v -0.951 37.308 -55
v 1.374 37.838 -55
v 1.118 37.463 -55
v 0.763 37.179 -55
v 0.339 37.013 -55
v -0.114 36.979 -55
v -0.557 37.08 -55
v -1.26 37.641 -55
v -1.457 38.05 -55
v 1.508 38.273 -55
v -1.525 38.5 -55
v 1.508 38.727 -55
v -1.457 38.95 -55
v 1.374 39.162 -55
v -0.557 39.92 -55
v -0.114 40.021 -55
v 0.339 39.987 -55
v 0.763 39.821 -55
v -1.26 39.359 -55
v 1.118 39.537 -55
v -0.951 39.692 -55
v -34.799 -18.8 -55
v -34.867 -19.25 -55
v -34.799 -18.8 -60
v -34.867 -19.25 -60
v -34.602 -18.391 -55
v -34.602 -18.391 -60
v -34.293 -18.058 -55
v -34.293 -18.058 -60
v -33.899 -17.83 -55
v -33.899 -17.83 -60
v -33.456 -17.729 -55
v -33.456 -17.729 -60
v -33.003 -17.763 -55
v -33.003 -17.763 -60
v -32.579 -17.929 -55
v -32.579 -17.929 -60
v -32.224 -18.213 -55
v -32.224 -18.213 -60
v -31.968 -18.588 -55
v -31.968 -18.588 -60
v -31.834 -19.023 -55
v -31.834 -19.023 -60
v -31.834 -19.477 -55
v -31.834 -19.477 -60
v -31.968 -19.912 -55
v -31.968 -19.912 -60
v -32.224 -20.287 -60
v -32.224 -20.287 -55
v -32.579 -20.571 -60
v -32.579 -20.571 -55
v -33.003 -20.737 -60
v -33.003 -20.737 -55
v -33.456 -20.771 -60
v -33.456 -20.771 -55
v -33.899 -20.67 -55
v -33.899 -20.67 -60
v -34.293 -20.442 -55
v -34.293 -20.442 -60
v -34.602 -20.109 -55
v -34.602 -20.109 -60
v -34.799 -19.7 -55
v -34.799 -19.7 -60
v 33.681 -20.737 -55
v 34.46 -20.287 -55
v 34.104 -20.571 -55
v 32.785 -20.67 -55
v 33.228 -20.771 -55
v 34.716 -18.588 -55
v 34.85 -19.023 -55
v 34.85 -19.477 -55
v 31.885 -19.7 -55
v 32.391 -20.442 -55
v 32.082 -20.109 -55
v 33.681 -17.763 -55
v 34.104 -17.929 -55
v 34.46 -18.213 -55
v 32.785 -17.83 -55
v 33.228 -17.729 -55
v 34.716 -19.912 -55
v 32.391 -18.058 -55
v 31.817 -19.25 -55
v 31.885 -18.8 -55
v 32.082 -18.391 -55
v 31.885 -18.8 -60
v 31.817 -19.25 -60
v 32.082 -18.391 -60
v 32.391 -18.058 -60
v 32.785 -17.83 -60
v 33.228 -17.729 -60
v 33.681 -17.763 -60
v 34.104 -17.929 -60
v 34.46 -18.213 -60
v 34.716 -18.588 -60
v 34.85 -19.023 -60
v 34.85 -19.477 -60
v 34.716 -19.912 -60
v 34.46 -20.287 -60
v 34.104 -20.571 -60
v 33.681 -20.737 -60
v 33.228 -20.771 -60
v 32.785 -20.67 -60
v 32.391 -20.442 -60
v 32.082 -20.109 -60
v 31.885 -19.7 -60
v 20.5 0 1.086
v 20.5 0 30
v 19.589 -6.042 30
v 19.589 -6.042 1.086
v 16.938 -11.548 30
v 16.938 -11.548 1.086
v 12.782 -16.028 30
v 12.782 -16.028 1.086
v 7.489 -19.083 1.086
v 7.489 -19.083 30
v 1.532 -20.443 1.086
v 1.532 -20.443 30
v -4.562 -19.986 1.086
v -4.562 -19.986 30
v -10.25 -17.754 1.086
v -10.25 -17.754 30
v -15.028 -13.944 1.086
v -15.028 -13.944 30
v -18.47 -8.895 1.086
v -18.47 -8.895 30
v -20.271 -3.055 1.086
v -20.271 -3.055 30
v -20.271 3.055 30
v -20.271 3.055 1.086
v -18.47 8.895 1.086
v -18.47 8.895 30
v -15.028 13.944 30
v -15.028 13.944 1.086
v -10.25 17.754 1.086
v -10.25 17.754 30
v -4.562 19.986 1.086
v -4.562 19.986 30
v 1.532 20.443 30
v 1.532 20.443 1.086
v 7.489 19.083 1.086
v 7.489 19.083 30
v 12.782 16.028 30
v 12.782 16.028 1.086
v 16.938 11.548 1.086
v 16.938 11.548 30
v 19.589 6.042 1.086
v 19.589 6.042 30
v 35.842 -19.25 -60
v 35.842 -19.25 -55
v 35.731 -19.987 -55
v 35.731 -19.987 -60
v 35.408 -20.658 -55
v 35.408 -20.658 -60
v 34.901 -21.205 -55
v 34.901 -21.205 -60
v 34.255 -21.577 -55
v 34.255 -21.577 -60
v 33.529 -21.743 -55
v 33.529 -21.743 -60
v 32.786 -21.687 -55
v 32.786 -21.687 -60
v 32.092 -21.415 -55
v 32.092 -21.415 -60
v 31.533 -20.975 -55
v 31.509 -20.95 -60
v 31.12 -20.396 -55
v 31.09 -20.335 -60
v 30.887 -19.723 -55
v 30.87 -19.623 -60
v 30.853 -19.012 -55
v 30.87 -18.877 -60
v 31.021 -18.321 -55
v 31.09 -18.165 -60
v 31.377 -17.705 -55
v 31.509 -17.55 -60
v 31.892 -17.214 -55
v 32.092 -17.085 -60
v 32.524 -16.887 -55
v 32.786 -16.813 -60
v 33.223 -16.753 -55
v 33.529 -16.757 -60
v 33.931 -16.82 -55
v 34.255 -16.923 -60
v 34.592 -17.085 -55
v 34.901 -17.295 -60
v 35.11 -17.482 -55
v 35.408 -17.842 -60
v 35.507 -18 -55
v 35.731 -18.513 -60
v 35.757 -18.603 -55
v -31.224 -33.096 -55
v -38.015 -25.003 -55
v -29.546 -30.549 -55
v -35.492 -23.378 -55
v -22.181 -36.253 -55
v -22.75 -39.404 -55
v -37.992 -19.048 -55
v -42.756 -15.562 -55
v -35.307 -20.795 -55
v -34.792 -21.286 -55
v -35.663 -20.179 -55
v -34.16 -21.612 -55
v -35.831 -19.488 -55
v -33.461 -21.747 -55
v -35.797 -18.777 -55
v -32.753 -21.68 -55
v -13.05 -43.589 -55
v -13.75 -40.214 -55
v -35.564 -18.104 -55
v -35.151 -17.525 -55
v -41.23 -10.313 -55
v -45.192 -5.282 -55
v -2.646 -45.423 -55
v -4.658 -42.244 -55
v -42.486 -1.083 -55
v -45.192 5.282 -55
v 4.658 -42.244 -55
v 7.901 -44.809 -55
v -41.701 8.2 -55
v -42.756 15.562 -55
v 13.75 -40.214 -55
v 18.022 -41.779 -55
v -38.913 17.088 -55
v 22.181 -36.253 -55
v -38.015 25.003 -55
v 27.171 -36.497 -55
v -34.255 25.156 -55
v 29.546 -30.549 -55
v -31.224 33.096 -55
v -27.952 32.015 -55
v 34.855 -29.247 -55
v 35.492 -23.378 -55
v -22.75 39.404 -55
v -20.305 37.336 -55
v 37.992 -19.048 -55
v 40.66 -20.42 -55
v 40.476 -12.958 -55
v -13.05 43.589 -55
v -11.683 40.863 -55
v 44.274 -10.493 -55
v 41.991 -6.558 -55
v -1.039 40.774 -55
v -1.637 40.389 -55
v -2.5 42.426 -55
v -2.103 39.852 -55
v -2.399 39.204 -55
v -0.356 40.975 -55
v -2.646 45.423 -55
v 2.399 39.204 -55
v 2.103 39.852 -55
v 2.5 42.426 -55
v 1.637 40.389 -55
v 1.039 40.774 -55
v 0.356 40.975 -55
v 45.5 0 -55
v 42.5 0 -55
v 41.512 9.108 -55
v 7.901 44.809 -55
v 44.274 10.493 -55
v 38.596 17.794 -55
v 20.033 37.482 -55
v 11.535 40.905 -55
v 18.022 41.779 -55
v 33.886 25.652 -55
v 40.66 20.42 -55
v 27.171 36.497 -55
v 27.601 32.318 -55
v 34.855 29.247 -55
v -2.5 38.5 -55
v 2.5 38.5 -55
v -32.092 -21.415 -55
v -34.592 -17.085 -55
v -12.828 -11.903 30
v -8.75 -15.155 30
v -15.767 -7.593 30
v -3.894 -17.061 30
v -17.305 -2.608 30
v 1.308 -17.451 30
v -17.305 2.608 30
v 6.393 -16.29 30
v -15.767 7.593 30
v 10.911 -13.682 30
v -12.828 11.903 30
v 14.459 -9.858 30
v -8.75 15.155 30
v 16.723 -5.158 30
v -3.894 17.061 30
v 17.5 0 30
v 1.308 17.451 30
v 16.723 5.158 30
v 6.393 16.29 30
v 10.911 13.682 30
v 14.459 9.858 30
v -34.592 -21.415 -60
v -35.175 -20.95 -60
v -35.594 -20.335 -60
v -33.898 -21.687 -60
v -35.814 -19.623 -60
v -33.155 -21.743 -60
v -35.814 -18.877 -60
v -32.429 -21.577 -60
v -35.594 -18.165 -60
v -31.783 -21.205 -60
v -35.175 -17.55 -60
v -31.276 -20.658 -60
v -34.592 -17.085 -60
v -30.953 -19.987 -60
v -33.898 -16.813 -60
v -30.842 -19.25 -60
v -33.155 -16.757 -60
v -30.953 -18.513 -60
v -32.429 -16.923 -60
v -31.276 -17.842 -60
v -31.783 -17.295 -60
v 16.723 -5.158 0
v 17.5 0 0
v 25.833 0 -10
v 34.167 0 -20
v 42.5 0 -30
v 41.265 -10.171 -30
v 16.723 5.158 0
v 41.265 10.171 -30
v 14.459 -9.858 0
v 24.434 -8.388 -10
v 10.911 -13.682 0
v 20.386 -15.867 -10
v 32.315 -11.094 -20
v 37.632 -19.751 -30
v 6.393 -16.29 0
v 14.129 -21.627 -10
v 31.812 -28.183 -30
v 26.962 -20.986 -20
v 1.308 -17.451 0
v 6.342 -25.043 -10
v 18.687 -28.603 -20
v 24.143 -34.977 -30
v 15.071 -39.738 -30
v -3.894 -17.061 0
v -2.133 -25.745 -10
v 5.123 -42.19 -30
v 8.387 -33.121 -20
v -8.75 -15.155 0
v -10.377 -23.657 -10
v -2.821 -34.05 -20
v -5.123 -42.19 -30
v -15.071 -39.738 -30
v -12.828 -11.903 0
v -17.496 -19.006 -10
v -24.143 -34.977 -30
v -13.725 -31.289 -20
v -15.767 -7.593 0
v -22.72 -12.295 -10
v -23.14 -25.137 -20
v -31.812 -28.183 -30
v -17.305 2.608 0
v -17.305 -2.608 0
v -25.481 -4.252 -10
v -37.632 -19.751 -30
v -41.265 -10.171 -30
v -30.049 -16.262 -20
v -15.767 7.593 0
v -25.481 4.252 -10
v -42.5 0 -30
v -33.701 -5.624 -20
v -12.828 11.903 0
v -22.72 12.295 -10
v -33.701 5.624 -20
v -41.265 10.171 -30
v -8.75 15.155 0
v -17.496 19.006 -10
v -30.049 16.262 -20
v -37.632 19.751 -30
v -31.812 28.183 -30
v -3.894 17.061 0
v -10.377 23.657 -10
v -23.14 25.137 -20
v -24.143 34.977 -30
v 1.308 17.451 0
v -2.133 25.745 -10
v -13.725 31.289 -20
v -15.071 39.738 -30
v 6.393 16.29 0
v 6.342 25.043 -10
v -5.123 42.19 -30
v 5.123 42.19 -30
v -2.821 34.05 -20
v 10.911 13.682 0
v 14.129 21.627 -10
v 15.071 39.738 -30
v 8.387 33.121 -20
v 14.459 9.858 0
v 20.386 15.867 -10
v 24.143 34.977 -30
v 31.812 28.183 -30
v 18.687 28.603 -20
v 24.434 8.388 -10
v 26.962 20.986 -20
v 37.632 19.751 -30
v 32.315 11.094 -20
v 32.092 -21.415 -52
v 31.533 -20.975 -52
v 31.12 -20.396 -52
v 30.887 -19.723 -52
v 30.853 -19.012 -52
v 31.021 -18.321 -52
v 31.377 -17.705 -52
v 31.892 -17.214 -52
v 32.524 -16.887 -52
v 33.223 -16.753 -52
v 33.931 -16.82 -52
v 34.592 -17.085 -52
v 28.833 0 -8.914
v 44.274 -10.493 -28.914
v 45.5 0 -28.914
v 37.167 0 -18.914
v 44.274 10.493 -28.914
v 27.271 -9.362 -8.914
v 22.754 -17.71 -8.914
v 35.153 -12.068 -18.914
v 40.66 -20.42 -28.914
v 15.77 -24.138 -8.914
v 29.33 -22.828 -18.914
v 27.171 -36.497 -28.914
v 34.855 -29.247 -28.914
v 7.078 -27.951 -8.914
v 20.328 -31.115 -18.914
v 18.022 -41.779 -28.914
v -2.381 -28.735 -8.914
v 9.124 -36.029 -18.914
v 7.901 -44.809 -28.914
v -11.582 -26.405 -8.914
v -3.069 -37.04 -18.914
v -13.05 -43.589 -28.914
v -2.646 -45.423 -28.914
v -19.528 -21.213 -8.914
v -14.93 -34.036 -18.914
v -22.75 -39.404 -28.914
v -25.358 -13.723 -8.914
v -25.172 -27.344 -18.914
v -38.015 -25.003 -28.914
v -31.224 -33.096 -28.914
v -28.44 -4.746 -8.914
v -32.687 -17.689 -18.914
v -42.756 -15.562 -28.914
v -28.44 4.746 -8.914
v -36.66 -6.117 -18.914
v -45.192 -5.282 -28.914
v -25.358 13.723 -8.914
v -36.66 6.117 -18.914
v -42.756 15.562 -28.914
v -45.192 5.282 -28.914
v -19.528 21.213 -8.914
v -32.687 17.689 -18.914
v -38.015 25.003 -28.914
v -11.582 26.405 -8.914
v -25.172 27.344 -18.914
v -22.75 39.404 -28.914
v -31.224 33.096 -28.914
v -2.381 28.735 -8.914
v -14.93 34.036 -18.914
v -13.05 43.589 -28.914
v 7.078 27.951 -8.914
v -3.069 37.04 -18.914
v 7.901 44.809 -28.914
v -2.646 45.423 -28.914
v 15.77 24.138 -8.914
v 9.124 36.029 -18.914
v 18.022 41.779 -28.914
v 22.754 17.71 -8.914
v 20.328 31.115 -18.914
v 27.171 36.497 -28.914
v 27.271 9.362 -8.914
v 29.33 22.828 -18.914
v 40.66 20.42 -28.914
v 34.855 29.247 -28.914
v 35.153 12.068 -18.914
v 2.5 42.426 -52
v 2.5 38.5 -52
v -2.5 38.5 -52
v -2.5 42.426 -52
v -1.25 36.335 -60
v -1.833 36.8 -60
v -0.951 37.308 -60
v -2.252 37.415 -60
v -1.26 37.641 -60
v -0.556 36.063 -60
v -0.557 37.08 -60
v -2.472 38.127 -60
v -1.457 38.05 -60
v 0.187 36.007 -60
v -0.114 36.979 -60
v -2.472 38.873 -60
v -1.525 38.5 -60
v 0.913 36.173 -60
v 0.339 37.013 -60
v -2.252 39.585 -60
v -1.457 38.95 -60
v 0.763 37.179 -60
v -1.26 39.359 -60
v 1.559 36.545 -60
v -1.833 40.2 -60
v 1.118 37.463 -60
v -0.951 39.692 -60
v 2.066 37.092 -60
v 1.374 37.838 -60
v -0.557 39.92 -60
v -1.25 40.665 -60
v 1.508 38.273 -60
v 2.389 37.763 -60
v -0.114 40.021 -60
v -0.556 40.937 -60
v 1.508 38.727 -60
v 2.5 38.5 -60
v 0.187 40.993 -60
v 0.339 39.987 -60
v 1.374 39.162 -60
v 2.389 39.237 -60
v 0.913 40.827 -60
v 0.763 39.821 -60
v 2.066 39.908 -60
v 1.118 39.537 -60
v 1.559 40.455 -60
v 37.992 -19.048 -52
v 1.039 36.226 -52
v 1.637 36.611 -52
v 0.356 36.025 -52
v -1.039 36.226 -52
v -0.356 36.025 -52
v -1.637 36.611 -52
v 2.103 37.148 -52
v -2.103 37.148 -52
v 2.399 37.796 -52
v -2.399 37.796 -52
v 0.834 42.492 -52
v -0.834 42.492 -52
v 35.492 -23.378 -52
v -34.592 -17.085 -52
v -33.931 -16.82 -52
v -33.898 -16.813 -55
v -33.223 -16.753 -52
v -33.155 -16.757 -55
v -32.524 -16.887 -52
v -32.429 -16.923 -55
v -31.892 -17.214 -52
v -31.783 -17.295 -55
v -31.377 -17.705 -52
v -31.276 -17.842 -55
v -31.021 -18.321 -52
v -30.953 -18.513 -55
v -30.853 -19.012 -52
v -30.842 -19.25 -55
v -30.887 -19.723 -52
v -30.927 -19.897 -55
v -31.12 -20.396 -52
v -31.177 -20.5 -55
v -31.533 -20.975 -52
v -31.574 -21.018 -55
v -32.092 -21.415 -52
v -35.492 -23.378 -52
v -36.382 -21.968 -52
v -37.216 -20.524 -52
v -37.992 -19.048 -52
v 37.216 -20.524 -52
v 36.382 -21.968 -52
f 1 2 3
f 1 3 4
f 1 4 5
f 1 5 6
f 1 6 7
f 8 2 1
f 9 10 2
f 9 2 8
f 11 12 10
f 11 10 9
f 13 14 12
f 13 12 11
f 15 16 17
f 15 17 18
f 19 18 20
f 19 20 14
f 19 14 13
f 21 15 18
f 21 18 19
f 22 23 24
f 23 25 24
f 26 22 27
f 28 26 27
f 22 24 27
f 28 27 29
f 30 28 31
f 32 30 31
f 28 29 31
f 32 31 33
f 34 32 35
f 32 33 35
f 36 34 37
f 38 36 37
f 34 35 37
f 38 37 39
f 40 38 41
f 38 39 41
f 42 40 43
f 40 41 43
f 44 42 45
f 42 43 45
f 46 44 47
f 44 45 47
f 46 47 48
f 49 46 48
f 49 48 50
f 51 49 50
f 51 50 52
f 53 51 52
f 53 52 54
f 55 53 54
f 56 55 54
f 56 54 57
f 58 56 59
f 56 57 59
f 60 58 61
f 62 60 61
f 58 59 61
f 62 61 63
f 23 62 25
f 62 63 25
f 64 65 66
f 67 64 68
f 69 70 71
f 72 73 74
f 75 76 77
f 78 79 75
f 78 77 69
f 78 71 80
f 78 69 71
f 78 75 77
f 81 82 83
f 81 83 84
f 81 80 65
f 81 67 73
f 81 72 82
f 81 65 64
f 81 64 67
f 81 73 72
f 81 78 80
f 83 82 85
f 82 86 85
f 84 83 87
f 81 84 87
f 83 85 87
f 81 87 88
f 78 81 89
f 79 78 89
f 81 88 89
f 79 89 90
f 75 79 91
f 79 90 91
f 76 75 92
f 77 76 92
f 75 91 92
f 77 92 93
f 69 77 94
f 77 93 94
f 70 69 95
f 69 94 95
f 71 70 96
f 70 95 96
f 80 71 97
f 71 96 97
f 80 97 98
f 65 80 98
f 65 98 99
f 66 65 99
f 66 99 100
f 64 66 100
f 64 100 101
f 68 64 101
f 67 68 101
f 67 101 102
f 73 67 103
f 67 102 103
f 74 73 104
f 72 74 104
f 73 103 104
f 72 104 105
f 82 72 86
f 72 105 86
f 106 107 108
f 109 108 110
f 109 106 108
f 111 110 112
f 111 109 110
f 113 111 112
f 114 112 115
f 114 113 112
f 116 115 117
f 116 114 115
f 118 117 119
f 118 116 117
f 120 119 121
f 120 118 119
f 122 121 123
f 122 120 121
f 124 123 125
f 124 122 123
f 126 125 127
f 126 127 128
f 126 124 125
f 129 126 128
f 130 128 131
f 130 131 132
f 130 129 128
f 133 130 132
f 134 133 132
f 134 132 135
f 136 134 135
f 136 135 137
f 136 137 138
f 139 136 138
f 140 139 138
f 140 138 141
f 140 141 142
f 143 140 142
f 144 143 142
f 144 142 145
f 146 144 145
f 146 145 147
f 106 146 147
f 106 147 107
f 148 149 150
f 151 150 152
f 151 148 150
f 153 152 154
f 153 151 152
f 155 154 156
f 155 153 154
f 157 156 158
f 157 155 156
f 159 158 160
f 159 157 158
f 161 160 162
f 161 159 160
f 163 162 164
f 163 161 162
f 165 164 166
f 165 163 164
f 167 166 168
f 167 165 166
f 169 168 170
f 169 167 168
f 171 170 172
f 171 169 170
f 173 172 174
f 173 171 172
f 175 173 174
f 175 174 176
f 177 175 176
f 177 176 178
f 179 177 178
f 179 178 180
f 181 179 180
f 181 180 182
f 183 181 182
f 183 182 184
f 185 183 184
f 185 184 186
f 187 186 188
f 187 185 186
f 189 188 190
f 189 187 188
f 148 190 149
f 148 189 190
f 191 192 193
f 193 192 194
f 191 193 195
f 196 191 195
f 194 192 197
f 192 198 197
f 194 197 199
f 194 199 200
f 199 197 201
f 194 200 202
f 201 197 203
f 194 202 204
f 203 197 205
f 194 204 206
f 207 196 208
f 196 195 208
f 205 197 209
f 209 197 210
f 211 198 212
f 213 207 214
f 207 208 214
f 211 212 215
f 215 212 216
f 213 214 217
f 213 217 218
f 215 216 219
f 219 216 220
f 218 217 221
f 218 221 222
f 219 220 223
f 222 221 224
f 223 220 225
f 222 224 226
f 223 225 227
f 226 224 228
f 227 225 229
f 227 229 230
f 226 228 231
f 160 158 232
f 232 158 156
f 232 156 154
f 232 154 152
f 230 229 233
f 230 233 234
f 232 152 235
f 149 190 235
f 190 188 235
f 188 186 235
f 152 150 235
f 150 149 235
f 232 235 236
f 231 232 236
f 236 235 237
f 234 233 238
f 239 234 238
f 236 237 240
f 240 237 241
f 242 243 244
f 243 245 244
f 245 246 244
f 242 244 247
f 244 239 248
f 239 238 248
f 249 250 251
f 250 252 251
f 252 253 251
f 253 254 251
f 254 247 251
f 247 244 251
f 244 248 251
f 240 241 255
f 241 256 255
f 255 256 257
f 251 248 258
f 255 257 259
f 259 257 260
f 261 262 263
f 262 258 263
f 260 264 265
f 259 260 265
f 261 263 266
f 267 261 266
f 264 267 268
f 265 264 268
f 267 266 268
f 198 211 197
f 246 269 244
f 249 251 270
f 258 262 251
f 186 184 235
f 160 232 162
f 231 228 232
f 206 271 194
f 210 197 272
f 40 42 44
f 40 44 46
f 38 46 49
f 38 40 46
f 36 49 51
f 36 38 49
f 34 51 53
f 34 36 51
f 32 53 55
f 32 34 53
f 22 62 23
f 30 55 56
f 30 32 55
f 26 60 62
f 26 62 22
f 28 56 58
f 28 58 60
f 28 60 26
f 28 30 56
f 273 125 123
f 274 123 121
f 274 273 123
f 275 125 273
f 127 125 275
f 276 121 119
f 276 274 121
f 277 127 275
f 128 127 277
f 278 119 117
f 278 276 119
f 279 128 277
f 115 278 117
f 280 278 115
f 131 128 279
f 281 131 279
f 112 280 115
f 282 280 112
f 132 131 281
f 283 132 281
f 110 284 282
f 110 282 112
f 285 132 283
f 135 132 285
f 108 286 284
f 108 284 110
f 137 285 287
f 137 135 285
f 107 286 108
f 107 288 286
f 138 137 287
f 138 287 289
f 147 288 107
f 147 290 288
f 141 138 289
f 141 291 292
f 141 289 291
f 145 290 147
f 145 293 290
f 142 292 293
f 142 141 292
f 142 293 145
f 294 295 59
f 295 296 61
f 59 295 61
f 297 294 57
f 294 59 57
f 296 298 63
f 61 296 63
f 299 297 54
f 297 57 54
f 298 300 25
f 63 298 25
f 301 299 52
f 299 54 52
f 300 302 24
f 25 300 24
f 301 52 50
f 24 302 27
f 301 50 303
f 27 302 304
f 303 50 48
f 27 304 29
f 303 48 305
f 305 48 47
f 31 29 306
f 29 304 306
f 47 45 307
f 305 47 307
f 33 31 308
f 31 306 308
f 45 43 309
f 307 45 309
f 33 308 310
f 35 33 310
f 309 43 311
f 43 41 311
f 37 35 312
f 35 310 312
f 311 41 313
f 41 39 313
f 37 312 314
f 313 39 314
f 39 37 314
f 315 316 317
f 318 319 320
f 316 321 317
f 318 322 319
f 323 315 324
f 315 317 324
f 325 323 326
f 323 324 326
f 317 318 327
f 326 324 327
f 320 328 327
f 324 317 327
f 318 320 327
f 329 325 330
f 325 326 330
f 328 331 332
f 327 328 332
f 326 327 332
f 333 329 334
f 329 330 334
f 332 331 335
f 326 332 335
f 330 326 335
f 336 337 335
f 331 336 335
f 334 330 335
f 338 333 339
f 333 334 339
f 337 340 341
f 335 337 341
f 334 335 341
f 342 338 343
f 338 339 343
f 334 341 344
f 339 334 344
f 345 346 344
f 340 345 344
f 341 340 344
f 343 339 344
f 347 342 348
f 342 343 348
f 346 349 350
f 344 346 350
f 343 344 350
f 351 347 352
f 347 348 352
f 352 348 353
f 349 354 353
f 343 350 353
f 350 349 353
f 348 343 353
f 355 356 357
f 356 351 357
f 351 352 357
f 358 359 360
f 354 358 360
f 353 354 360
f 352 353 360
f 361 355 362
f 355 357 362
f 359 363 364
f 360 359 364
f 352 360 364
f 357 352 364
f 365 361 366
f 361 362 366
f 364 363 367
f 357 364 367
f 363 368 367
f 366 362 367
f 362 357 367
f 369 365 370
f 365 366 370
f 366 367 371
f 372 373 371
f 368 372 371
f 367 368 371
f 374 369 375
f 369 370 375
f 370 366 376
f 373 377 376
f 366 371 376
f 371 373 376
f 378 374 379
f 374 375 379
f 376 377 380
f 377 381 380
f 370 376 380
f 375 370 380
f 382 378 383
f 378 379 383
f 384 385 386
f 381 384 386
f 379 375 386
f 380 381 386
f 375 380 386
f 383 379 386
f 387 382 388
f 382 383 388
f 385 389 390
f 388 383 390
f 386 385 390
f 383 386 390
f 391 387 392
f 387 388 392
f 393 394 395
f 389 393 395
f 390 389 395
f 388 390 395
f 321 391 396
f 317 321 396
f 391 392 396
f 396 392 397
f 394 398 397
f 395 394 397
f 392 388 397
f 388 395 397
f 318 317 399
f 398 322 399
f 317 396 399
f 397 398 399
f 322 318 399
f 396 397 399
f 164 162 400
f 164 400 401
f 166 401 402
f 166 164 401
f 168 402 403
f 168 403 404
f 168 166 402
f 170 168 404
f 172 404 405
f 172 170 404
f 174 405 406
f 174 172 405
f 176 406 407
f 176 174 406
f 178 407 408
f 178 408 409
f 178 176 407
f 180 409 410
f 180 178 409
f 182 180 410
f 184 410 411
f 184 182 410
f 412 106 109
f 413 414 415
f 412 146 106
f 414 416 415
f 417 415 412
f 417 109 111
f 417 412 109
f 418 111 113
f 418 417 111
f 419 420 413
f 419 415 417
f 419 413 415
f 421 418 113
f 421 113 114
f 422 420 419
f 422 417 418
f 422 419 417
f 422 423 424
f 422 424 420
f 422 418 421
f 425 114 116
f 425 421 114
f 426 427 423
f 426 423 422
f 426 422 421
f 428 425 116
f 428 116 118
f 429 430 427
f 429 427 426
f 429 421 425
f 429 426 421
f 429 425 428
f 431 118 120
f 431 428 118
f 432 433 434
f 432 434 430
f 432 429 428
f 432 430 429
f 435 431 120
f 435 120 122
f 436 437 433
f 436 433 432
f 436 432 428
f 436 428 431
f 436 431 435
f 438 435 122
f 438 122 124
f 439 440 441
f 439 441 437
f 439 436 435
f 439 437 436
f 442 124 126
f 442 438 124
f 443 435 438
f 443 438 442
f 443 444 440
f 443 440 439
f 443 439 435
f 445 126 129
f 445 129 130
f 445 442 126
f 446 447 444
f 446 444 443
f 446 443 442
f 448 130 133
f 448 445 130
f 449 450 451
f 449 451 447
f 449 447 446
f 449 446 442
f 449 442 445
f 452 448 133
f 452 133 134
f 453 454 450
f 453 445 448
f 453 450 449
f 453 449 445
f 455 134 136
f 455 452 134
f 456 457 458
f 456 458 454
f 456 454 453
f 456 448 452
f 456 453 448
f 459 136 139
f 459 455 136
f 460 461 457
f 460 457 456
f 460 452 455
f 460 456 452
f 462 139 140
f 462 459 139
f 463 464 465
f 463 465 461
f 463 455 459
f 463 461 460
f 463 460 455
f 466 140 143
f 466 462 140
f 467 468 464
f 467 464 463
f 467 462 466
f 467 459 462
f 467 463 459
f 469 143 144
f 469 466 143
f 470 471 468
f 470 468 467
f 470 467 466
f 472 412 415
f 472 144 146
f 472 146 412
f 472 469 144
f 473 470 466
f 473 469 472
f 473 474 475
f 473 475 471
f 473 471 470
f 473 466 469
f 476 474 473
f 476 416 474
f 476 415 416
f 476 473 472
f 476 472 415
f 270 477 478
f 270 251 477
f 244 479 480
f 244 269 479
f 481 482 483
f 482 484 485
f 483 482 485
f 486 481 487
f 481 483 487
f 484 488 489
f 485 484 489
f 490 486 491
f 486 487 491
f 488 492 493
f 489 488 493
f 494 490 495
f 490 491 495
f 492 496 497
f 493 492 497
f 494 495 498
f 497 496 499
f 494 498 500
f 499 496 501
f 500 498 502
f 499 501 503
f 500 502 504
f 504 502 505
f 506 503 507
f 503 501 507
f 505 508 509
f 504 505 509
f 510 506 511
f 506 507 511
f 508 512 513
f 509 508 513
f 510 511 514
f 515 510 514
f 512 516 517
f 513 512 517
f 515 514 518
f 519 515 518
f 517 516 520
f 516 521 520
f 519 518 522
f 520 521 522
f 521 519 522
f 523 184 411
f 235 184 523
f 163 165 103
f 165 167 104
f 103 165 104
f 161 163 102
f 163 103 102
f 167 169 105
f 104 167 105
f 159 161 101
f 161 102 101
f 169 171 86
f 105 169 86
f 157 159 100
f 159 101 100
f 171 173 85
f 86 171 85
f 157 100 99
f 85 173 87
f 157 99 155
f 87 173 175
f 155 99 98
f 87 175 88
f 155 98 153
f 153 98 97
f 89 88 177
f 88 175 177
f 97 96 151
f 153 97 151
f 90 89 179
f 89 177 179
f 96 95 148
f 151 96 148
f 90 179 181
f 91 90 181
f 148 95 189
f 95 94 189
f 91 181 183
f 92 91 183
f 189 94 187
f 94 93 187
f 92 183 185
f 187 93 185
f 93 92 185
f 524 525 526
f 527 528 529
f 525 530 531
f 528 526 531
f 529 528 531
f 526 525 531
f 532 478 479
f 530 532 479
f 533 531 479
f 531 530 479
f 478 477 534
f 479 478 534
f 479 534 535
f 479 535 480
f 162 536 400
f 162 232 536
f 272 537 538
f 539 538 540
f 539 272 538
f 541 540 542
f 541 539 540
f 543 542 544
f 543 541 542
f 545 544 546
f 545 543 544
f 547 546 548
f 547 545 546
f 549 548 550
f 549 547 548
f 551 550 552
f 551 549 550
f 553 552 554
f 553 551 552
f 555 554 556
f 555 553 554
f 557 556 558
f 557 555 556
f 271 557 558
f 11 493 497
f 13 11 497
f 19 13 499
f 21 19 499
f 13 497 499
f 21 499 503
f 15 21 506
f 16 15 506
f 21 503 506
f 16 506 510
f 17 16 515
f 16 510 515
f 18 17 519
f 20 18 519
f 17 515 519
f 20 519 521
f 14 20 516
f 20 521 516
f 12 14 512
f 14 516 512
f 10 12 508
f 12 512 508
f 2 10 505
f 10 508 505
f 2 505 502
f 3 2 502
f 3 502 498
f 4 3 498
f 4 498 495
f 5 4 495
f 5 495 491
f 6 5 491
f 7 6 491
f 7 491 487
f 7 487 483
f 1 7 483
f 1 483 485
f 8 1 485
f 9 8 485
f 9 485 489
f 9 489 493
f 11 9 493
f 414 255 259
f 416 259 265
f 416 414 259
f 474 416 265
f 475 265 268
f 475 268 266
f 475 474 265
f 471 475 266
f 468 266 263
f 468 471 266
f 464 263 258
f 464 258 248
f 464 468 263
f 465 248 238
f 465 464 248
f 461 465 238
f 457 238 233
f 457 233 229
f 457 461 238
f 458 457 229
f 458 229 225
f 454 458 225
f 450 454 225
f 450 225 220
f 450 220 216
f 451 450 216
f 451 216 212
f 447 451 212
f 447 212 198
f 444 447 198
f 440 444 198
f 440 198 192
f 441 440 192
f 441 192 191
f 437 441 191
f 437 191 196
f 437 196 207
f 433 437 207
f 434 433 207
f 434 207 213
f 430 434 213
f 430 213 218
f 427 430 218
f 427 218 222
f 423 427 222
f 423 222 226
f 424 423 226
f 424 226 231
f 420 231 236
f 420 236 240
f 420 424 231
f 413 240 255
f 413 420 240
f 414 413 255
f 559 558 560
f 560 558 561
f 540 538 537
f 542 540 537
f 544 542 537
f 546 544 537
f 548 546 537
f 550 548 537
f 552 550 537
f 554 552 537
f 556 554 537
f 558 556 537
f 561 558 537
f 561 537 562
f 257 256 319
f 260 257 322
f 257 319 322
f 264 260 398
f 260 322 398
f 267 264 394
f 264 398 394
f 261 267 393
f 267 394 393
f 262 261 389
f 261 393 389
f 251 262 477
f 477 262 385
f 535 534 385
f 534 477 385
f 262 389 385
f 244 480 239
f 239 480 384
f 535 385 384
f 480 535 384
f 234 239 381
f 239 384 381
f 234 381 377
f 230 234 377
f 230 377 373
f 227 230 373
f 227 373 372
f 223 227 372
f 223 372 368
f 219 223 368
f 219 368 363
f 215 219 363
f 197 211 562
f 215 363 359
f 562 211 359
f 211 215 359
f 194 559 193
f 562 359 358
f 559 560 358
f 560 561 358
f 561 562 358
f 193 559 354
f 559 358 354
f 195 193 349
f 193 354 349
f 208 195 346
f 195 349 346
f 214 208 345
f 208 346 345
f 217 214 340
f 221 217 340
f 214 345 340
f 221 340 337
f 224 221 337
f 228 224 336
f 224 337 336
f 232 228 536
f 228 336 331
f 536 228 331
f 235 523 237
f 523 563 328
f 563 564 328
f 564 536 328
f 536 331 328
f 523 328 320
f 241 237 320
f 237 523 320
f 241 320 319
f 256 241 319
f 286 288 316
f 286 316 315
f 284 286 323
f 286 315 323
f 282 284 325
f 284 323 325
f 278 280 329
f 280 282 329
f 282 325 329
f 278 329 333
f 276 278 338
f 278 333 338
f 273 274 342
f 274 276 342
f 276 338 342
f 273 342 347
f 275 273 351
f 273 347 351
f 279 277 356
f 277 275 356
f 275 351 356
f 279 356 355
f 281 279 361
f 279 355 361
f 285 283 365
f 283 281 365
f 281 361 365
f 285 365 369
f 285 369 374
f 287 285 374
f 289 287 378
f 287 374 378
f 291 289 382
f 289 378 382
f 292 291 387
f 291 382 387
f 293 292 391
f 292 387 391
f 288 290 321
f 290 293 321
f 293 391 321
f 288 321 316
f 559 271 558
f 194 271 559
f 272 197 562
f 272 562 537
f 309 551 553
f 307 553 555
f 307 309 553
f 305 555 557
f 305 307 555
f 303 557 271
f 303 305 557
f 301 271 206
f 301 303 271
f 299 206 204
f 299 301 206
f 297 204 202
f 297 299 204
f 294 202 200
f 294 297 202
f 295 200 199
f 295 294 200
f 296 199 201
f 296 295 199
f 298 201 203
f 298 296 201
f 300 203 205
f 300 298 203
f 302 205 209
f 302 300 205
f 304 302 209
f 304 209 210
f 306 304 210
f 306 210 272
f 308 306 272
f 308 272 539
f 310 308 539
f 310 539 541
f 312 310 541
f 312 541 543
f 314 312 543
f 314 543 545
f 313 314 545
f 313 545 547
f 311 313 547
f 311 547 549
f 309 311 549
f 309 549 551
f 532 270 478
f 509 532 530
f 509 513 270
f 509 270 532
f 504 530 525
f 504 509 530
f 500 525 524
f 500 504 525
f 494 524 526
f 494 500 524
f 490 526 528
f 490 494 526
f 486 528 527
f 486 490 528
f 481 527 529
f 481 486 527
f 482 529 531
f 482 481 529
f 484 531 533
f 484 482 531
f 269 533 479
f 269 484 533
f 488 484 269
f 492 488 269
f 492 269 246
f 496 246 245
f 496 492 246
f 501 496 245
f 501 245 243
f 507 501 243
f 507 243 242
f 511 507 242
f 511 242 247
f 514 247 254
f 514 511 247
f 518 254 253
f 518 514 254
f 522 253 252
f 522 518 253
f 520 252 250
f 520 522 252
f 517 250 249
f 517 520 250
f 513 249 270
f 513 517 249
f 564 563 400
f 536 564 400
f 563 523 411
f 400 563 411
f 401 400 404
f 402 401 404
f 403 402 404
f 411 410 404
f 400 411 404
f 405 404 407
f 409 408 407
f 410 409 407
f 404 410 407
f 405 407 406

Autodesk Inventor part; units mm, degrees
ref_plane "YZ Plane" through (0, 0, 0) normal (1, 0, 0) x (0, 1, 0)
ref_plane "XZ Plane" through (0, 0, 0) normal (0, 1, 0) x (-1, 0, 0)
sketch "Boceto1" plane through (0, 0, 0) normal (0, 0, 1) x (1, 0, 0)
  line L0 (0, 124.4663) -> (0, -121.5162) construction
  line L1 (-141.4483, 0) -> (147.5578, 0) construction
  circle A0 centre (0, 0) radius 17.5
  dimension "d0" = 35
extrude "Extrusión1" add sketch "Boceto1" along normal blind 30
ref_plane "Plano de trabajo1" through (0, 0, -30) normal (0, 0, 1) x (1, 0, 0)
sketch "Boceto2" plane through (0, 0, -30) normal (0, 0, 1) x (1, 0, 0)
  circle A0 centre (0, 0) radius 42.5
  dimension "d4" = 85
loft "Solevación1" add profiles "Boceto2" section 2 edges at (-17.5, 0, 0)
ref_plane "Plano de trabajo2" through (0, 0, -55) normal (0, 0, 1) x (1, 0, 0)
sketch "Boceto3" plane through (0, 0, -55) normal (0, 0, 1) x (1, 0, 0)
  circle A0 centre (0, 0) radius 42.5
  dimension "d10" = 85
loft "Solevación2" add profiles "Boceto3" section 2 edges at (-42.5, 0, -30)
shell "Vaciado1" thickness 3 outward yes removed faces 2 at (-10.6049, 7.3037, -55) at (4.3663, -1.0762, 30)
sketch "Boceto4" plane through (0, 0, -55) normal (0, 0, -1) x (-1, 0, 0)
  circle A0 centre (0, 0) radius 44.5
  circle A1 centre (0, 0) radius 42.5
  line L0 (-2.5, 42.4264) -> (-2.5, 36.4244)
  line L1 (-2.5, 36.4244) -> (2.5, 36.4244)
  line L2 (2.5, 36.4244) -> (2.5, 42.4264)
  line L3 (-61.729, 0) -> (90.2911, 0) construction
  line L4 (0, 48.1461) -> (0, -48.1461) construction
  circle A2 centre (0, 0) radius 37 construction
  circle A3 centre (0, 0) radius 40 construction
  circle A4 centre (0, 0) radius 38.5 construction
  arc A5 (-2.5, 38.5) -> (2.5, 38.5) centre (0, 38.5) ccw
  line L5 (-35.4923, -23.3783) -> (-30.2945, -20.3773)
  arc A6 (-32.092, -21.4151) -> (-34.592, -17.0849) centre (-33.342, -19.25) ccw
  line L6 (-32.7945, -16.0472) -> (-37.9923, -19.0481)
  line L7 (37.9923, -19.0481) -> (32.7945, -16.0472)
  arc A7 (34.592, -17.0849) -> (32.092, -21.4151) centre (33.342, -19.25) ccw
  line L8 (30.2945, -20.3773) -> (35.4923, -23.3783)
  dimension "d21" = 77
  dimension "d16" = 85
  dimension "d17" = 74
  dimension "d18" = 80
  dimension "d19" = 5
  dimension "d20" = 6.002
  dimension "d22" = 5
  dimension "d25" = 360
extrude "Extrusión2" add sketch "Boceto4" against normal blind 3 contours L2 A5 L1 L0 A1 | A1 L8 A7 L7 | L6 A6 L5 A1 | A5 L1
ref_plane "Plano de trabajo3" through (0, 0, -60) normal (0, 0, 1) x (1, 0, 0)
sketch "Boceto5" plane through (0, 0, -60) normal (0, 0, 1) x (1, 0, 0)
  line L0 (0, 47.3974) -> (0, -47.5019) construction
  line L1 (54.9107, 0) -> (-68.9978, 0) construction
  circle A0 centre (0, 0) radius 38.5 construction
  circle A1 centre (0, 38.5) radius 2.5
  circle A2 centre (-33.342, -19.25) radius 2.5
  circle A3 centre (33.342, -19.25) radius 2.5
  dimension "d30" = 77
  dimension "d31" = 5
  dimension "d34" = 360
extrude "Extrusión3" add sketch "Boceto5" along normal blind 5
sketch "Boceto6" plane through (33.342, -19.25, -60) normal (0, 0, -1) x (-1, 0, 0)
  circle A0 centre (0, 0) radius 1.525
  circle A1 centre (0, 0) radius 2.5 construction
  circle A2 centre (66.684, 0) radius 1.525
  circle A3 centre (33.342, 57.75) radius 1.525
  point P0 (33.342, 19.25)
  dimension "d38" = 3.05
  dimension "d39" = 0.975
  dimension "d42" = 360
extrude "Extrusión4" cut sketch "Boceto6" against normal blind 5
properties part number "CAPSULA 1 MEDIDOR ESPORAS"
